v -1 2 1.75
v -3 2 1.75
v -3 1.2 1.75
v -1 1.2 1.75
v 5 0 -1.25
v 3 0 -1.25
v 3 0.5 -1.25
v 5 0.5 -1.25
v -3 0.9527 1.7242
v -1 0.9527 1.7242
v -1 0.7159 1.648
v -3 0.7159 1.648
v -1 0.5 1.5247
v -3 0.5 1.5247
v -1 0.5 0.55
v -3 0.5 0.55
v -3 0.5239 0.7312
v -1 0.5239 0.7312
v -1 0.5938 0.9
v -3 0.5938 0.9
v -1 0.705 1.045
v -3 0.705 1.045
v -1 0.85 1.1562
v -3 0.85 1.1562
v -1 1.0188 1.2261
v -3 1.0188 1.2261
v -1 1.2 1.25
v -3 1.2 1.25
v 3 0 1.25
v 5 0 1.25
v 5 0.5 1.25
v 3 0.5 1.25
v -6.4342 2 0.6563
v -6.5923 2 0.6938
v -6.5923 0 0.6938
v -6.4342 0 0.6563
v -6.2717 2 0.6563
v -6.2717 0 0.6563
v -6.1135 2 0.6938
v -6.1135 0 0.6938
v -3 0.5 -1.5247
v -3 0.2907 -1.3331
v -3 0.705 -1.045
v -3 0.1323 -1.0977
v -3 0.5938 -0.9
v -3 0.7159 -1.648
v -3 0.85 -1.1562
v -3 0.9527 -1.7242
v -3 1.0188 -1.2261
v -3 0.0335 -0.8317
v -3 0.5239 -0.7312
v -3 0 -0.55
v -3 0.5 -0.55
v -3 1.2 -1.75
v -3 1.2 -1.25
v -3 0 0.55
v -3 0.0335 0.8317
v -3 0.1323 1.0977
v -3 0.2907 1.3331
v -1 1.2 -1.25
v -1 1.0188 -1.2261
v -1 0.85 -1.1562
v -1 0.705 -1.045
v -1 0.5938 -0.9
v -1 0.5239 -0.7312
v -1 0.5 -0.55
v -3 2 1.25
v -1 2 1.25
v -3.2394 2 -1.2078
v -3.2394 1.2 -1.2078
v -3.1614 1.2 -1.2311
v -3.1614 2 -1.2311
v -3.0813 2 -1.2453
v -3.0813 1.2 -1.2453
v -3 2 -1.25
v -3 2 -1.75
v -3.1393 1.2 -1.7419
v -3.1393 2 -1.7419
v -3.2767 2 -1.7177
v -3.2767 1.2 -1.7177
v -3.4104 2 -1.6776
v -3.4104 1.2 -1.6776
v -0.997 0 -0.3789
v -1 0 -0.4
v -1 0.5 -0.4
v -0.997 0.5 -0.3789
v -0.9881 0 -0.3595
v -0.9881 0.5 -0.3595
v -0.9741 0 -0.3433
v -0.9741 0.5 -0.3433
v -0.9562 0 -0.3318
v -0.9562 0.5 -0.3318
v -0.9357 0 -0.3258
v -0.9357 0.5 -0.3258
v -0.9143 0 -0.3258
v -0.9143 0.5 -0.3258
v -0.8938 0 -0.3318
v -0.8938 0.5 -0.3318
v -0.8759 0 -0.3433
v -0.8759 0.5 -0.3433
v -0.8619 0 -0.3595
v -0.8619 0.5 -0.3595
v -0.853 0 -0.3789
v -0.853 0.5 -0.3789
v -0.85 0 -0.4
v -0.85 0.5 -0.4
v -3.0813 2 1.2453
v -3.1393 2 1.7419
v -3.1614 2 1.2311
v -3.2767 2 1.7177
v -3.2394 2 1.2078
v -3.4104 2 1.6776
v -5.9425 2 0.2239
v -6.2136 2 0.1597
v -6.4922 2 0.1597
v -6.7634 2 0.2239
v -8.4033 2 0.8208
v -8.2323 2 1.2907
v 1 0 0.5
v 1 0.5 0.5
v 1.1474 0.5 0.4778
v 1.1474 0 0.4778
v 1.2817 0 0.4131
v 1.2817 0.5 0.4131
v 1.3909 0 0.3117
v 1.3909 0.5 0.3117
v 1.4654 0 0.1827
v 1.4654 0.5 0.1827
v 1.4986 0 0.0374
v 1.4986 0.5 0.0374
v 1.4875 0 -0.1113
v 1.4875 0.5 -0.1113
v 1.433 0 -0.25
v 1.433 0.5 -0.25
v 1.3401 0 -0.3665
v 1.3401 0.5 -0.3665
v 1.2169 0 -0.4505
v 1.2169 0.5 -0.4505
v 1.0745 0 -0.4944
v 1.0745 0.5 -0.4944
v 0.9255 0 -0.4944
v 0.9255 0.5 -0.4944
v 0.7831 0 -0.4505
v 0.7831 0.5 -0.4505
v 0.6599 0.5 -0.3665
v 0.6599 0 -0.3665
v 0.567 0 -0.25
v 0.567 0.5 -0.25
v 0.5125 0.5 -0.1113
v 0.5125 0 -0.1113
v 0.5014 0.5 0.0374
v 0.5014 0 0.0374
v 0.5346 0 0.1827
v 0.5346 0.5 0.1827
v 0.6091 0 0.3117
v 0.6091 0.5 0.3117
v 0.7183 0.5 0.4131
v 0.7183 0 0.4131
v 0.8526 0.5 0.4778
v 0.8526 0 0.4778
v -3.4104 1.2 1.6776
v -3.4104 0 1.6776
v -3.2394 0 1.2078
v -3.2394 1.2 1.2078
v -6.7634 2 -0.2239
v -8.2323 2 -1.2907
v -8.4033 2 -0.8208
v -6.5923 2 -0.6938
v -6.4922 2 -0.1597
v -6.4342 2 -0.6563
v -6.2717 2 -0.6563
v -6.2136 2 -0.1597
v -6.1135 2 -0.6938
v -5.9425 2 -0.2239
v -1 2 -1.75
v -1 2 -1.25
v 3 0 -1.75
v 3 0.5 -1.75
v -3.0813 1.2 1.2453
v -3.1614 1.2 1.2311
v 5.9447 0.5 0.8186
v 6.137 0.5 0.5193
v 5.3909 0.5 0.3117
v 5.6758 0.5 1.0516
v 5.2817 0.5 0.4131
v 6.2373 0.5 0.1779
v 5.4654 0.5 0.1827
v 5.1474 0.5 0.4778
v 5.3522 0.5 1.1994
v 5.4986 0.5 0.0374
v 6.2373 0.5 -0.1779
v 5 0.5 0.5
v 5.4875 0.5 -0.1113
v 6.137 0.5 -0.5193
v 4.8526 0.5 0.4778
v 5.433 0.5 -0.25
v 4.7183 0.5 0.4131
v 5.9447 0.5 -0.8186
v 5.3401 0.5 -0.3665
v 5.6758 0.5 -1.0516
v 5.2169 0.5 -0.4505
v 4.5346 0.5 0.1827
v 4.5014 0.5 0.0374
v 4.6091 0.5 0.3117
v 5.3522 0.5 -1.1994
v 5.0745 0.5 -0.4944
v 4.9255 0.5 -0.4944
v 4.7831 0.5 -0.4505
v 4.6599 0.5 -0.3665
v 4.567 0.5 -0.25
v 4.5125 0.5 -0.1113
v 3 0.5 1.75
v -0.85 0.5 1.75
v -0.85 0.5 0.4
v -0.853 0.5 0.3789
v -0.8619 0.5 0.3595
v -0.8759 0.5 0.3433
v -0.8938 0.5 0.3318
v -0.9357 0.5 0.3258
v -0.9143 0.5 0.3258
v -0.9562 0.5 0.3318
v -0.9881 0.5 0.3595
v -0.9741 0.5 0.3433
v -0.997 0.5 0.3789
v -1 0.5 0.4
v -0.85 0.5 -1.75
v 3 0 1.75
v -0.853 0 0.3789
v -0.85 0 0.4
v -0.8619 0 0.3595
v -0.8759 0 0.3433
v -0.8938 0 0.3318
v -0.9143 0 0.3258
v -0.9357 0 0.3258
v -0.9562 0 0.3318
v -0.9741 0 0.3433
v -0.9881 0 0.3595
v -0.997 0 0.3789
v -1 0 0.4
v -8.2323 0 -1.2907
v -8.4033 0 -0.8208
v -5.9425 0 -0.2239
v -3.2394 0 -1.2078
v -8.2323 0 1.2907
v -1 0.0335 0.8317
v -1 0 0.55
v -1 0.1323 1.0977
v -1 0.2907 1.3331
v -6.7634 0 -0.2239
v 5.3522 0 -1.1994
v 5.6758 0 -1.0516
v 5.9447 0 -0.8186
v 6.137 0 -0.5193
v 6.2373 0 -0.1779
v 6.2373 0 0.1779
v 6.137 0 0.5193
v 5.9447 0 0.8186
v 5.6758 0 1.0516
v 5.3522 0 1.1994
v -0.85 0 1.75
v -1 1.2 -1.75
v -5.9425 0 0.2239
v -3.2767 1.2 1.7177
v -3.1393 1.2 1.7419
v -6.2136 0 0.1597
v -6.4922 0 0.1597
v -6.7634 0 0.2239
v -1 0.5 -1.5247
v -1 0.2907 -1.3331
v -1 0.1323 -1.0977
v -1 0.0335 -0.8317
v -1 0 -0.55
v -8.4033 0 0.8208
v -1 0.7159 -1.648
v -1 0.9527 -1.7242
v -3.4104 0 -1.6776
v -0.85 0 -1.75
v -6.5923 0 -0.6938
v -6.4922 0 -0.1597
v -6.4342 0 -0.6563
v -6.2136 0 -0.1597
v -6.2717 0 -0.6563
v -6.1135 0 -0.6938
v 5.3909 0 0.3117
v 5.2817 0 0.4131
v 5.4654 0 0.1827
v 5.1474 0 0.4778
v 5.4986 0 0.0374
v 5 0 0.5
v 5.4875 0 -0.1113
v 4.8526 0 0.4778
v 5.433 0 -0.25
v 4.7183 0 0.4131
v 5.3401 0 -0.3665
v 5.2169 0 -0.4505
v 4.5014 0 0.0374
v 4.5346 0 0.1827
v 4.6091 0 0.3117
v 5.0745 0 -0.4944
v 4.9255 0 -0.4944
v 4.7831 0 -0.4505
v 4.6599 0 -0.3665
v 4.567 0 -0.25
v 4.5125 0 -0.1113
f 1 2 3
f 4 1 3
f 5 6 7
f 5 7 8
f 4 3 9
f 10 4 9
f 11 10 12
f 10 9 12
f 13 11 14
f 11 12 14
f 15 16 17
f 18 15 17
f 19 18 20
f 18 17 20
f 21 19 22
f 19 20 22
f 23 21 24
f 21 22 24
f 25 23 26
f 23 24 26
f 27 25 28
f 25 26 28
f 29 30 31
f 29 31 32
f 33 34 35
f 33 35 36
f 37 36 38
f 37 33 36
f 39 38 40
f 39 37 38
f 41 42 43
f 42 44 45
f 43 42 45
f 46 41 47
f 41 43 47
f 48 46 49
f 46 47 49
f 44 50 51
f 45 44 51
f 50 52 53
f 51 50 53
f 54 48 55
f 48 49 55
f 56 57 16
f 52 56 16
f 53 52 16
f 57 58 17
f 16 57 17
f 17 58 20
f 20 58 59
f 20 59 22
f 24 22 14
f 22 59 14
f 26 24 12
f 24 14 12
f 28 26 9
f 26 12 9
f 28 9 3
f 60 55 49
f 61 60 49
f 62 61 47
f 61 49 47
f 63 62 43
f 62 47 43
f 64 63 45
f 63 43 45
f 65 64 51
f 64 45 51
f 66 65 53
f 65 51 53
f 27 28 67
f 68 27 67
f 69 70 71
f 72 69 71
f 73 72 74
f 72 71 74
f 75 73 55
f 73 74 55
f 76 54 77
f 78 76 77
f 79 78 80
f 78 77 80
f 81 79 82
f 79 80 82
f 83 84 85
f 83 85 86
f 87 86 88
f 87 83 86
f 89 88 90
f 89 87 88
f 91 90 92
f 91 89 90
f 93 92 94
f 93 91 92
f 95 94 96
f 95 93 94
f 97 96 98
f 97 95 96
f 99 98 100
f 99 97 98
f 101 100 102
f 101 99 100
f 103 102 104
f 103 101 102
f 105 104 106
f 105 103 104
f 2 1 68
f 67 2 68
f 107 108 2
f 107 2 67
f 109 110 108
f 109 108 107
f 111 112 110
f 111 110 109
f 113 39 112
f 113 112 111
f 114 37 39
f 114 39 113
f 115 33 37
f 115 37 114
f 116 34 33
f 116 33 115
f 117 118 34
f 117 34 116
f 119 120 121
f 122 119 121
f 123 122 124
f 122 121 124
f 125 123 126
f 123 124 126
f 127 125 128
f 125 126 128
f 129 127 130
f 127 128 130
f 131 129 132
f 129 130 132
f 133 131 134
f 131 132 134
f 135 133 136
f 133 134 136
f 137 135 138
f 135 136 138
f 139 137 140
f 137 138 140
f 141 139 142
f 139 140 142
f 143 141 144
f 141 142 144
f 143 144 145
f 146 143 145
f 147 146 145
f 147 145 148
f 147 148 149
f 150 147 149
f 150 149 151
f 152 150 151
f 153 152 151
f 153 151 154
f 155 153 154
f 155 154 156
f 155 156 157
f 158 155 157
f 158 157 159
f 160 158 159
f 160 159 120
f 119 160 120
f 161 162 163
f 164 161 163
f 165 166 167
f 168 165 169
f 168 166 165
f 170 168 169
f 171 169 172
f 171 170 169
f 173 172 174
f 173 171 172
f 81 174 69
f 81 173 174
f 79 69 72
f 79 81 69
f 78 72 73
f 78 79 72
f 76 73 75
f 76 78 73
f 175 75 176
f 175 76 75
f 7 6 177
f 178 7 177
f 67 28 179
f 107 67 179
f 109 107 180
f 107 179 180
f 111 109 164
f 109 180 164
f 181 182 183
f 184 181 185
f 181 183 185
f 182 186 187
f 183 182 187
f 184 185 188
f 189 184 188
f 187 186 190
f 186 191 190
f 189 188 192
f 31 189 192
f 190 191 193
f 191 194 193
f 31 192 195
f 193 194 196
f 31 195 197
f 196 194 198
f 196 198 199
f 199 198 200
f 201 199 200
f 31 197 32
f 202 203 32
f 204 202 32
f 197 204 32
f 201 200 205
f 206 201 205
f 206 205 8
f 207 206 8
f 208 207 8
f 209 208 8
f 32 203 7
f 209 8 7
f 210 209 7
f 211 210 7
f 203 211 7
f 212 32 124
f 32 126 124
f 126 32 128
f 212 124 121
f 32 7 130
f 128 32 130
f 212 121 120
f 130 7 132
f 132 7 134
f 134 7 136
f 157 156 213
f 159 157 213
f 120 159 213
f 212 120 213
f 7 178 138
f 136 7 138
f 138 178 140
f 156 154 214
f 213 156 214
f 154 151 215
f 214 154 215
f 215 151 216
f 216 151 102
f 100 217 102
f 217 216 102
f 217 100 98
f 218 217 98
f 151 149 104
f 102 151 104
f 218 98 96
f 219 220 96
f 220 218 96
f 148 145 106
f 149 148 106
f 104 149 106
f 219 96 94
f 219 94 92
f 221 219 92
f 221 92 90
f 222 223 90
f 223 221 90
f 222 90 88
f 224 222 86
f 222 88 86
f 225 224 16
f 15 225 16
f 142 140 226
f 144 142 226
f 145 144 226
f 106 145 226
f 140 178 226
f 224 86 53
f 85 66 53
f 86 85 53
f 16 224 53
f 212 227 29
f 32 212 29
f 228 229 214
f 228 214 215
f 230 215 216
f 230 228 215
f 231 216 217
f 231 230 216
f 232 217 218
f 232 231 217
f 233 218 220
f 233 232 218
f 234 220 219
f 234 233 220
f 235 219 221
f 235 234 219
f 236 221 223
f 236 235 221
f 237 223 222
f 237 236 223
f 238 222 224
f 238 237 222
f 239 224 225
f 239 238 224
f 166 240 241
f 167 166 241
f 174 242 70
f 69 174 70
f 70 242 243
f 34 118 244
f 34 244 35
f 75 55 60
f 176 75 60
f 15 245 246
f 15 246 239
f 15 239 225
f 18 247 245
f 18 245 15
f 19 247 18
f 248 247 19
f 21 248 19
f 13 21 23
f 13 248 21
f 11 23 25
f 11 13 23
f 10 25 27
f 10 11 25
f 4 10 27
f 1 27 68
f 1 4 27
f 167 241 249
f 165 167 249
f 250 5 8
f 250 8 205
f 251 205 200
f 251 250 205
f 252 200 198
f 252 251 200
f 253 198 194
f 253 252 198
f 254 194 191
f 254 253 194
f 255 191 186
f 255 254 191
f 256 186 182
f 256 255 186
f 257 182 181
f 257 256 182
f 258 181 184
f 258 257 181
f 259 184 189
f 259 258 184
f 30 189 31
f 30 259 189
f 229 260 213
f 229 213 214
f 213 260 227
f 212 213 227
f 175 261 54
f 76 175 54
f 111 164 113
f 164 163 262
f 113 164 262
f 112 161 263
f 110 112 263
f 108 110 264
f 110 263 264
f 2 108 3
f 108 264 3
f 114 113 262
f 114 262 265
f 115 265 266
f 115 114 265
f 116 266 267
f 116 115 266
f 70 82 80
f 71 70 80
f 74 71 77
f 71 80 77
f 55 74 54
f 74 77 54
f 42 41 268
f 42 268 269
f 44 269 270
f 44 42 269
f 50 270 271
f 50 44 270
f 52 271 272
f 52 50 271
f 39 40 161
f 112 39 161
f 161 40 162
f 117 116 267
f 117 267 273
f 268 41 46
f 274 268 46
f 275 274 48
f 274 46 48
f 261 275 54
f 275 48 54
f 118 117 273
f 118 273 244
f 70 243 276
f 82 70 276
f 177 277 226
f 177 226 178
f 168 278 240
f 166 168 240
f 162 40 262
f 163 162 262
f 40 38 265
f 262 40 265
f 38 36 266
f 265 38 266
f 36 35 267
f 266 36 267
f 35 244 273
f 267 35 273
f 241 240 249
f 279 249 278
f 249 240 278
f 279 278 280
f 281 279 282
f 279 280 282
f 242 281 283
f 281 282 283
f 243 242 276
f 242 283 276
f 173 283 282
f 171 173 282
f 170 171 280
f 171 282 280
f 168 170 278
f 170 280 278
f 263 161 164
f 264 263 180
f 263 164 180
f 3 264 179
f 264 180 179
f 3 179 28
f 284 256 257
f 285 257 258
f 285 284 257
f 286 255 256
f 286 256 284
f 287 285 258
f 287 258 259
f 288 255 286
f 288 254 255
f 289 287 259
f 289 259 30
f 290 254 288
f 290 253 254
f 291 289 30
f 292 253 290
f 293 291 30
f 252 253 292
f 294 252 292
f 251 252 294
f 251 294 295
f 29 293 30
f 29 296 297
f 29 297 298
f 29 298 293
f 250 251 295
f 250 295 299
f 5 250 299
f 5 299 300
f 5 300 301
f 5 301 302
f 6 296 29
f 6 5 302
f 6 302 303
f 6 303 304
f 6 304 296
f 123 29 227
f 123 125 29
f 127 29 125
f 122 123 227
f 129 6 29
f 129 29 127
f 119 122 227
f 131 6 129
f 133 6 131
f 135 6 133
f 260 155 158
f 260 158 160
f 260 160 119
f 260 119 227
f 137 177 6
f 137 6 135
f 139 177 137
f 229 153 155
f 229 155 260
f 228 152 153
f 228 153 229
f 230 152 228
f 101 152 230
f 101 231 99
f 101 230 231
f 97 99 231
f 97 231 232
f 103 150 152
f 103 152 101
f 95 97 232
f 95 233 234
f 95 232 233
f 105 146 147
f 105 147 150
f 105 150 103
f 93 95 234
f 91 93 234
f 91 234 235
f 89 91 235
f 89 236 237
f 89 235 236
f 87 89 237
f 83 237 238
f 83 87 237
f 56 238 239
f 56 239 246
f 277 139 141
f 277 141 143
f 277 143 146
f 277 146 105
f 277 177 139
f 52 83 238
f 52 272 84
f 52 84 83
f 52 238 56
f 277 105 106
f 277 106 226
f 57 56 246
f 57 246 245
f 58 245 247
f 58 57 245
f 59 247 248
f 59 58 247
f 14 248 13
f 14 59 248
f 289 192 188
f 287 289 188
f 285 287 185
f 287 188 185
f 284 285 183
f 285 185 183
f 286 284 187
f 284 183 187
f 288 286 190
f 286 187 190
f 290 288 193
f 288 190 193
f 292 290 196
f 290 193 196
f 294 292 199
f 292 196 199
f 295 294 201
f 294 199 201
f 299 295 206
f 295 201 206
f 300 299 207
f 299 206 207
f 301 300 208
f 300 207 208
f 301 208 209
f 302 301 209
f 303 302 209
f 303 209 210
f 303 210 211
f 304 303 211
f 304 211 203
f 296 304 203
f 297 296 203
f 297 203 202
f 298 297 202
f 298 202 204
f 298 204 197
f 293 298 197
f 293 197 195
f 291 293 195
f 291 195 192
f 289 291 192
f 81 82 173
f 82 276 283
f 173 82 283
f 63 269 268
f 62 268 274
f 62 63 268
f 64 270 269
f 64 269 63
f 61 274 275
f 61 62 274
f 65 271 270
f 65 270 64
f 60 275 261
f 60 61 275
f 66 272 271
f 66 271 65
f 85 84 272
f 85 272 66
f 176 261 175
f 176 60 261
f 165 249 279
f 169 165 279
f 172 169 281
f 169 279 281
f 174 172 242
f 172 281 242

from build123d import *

# Parameters (mm, degrees)
SKETCH1_W                      = 6
SKETCH1_H                      = 3.5
BASE_DEPTH                     = 0.5
TAB_DEPTH                      = 0.5
SKETCH3_R                      = 0.5
SOLDERING_HOLE_DEPTH           = 7.509608283
SKETCH4_R                      = 0.5
RIVET_HOLE_DEPTH               = 7.509608283
FIRST_START                    = -3
FIRST_SIDE_TAB_DEPTH           = 2.15
FIRST_SIDE_TAB_2_DEPTH         = 2
FIRST_START_2                  = -1
FIRST_SIDE_TAB_3_DEPTH         = 2.2
SECOND_ANGLED_SIDE_TAB_DEPTH   = 2
SECOND_START                   = 1.2
SECOND_ANGLED_SIDE_TAB_2_DEPTH = 0.8
THIRD_ANGLED_SIDE_TAB_DEPTH    = 2
MIRROR1_DEPTH                  = 0.5
MIRROR1_2_OUTLINE_W            = 2
MIRROR1_2_OUTLINE_H            = 0.5
MIRROR1_2_DEPTH                = 0.04719
MIRROR1_3_DEPTH                = 2
MIRROR1_START                  = 1.2
MIRROR1_4_DEPTH                = 0.8
MIRROR1_START_2                = -3
MIRROR1_5_DEPTH                = 2
MIRROR1_6_DEPTH                = 2


with BuildPart() as part:
    # Sketch1 → BASE (new body)
    with BuildSketch(Plane(origin=(0, 0, 0), x_dir=(1, 0, 0), z_dir=(0, 1, 0))):
        Rectangle(SKETCH1_W, SKETCH1_H)
    extrude(amount=BASE_DEPTH)

    # Sketch2 → TAB (add)
    with BuildSketch(Plane(origin=(0, 0, 0), x_dir=(1, 0, 0), z_dir=(0, 1, 0))):
        with BuildLine():
            Line((5, -1.25), (3, -1.25))
            ThreePointArc((3, -1.25), (1.75, 0), (3, 1.25))
            Line((3, 1.25), (5, 1.25))
            ThreePointArc((5, 1.25), (6.25, 0), (5, -1.25))
        make_face()
    extrude(amount=TAB_DEPTH)

    # Sketch3 → SOLDERING HOLE (cut, through all)
    with BuildSketch(Plane(origin=(0, 0.5, 0), x_dir=(1, 0, 0), z_dir=(0, 1, 0))):
        with Locations(Location((5, 0, 0), (0, 0, 270))):
            Circle(SKETCH3_R)
    extrude(amount=-SOLDERING_HOLE_DEPTH, mode=Mode.SUBTRACT)

    # Sketch4 → RIVET HOLE (cut, through all)
    with BuildSketch(Plane(origin=(0, 0.5, 0), x_dir=(1, 0, 0), z_dir=(0, 1, 0))):
        with Locations(Location((1, 0, 0), (0, 0, 270))):
            Circle(SKETCH4_R)
    extrude(amount=-RIVET_HOLE_DEPTH, mode=Mode.SUBTRACT)

    # FIRST SIDE TAB: read off the stored shape, not the designer's step
    # FIRST SIDE TAB outline → FIRST SIDE TAB (cut)
    with BuildSketch(Plane.YZ.offset(FIRST_START)):
        with BuildLine():
            ThreePointArc((0, 0.55), (0.132292175, 1.097722557), (0.5, 1.524679434))
            Line((0.5, 1.524679434), (0.5, 1.75))
            Line((0.5, 1.75), (0, 1.75))
            Line((0, 1.75), (0, 0.55))
        make_face()
    extrude(amount=FIRST_SIDE_TAB_DEPTH, mode=Mode.SUBTRACT)

    # FIRST SIDE TAB 2 outline → FIRST SIDE TAB 2 (add)
    with BuildSketch(Plane.YZ.offset(FIRST_START)):
        with BuildLine():
            Line((2, 1.75), (1.2, 1.75))
            ThreePointArc((1.2, 1.75), (0.832314891, 1.692281778), (0.5, 1.524679434))
            Line((0.5, 1.524679434), (0.5, 0.55))
            ThreePointArc((0.5, 0.55), (0.705025253, 1.044974747), (1.2, 1.25))
            Line((1.2, 1.25), (2, 1.25))
            Line((2, 1.25), (2, 1.75))
        make_face()
    extrude(amount=FIRST_SIDE_TAB_2_DEPTH)

    # FIRST SIDE TAB 3 outline → FIRST SIDE TAB 3 (cut)
    with BuildSketch(Plane(origin=(0, 0, 0), x_dir=(1, 0, 0), z_dir=(0, 1, 0)).offset(FIRST_START_2)):
        with BuildLine():
            Line((-0.85, -3), (-0.85, -0.4))
            ThreePointArc((-0.85, -0.4), (-0.925, -0.325), (-1, -0.4))
            Line((-1, -0.4), (-1, -3))
            Line((-1, -3), (-0.85, -3))
        make_face()
    extrude(amount=FIRST_SIDE_TAB_3_DEPTH, mode=Mode.SUBTRACT)



with BuildPart() as body_2:
    # SECOND ANGLED SIDE TAB: read off the stored shape, not the designer's step
    # SECOND ANGLED SIDE TAB outline → SECOND ANGLED SIDE TAB (new body)
    with BuildSketch(Plane(origin=(0, 0, 0), x_dir=(1, 0, 0), z_dir=(0, 1, 0))):
        Polygon((-6.113516821, -0.69378588), (-3.410424172, -1.677631145), (-3.2394141, -1.207784835), (-5.942506749, -0.22393957), align=None)
    extrude(amount=SECOND_ANGLED_SIDE_TAB_DEPTH)


with BuildPart() as part_1:
    add(part.part)

    add(body_2.part)  # SECOND ANGLED SIDE TAB 2 merges body 2
    # SECOND ANGLED SIDE TAB 2 outline → SECOND ANGLED SIDE TAB 2 (add)
    with BuildSketch(Plane(origin=(0, 0, 0), x_dir=(1, 0, 0), z_dir=(0, 1, 0)).offset(SECOND_START)):
        with BuildLine():
            Line((-3.2394141, -1.207784835), (-3.410424172, -1.677631145))
            ThreePointArc((-3.410424172, -1.677631145), (-3.208377813, -1.731769304), (-3, -1.75))
            Line((-3, -1.75), (-3, -1.25))
            ThreePointArc((-3, -1.25), (-3.121553724, -1.239365427), (-3.2394141, -1.207784835))
        make_face()
    extrude(amount=SECOND_ANGLED_SIDE_TAB_2_DEPTH)

    # THIRD ANGLED SIDE TAB: sheet metal written as solids
    # THIRD ANGLED SIDE TAB section (on a plane across the edge) → THIRD ANGLED SIDE TAB (add)
    with BuildSketch(Plane(origin=(-6.352930921, 2, 0.606646274), x_dir=(0.3420201433256691, 0, 0.9396926207859083), z_dir=(0, -1, 0))):
        with BuildLine():
            Line((-0.5, 0.254779164), (-0.5, 2))
            Line((-0.5, 2), (0, 2))
            Line((0, 2), (0, 0.254779164))
            ThreePointArc((0, 0.254779164), (0.042215165, 0.015365064), (0.16376889, -0.195172163))
            Line((0.16376889, -0.195172163), (-0.219253332, -0.516565968))
            ThreePointArc((-0.219253332, -0.516565968), (-0.427631145, -0.155645008), (-0.5, 0.254779164))
        make_face()
    extrude(amount=THIRD_ANGLED_SIDE_TAB_DEPTH)

    # Mirror1: read off the stored shape, not the designer's step
    # Mirror1 outline → Mirror1 (cut)
    with BuildSketch(Plane(origin=(0, 0, 0), x_dir=(1, 0, 0), z_dir=(0, 1, 0))):
        with BuildLine():
            Line((-0.85, 1.75), (-1, 1.75))
            Line((-1, 1.75), (-1, 0.4))
            ThreePointArc((-1, 0.4), (-0.925, 0.325), (-0.85, 0.4))
            Line((-0.85, 0.4), (-0.85, 1.75))
        make_face()
    extrude(amount=MIRROR1_DEPTH, mode=Mode.SUBTRACT)

    # Mirror1 2 outline → Mirror1 2 (cut)
    with BuildSketch(Plane(origin=(0, 0, 0), x_dir=(1, 0, 0), z_dir=(0, 1, 0))):
        with Locations((-2, 1.5)):
            Rectangle(MIRROR1_2_OUTLINE_W, MIRROR1_2_OUTLINE_H)
    extrude(amount=MIRROR1_2_DEPTH, mode=Mode.SUBTRACT)

    # Mirror1 5 outline → Mirror1 5 (cut)
    with BuildSketch(Plane.YZ.offset(MIRROR1_START_2)):
        with BuildLine():
            Line((0.5, -1.75), (0.5, -1.524679434))
            ThreePointArc((0.5, -1.524679434), (0.132292175, -1.097722557), (0, -0.55))
            Line((0, -0.55), (0, -1.25))
            Line((0, -1.25), (0.04719, -1.25))
            Line((0.04719, -1.25), (0.04719, -1.75))
            Line((0.04719, -1.75), (0.5, -1.75))
        make_face()
    extrude(amount=MIRROR1_5_DEPTH, mode=Mode.SUBTRACT)



with BuildPart() as body_2_2:
    # Mirror1 3 outline → Mirror1 3 (new body)
    with BuildSketch(Plane(origin=(0, 0, 0), x_dir=(1, 0, 0), z_dir=(0, 1, 0))):
        with BuildLine():
            Line((-3.2394141, 1.207784835), (-3.410424172, 1.677631145))
            Line((-3.410424172, 1.677631145), (-6.113516821, 0.69378588))
            ThreePointArc((-6.113516821, 0.69378588), (-6.352930921, 0.651570715), (-6.592345021, 0.69378588))
            Line((-6.592345021, 0.69378588), (-8.232316162, 1.290686561))
            Line((-8.232316162, 1.290686561), (-8.403326234, 0.82084025))
            Line((-8.403326234, 0.82084025), (-6.763355093, 0.22393957))
            ThreePointArc((-6.763355093, 0.22393957), (-6.352930921, 0.151570715), (-5.942506749, 0.22393957))
            Line((-5.942506749, 0.22393957), (-3.2394141, 1.207784835))
        make_face()
    extrude(amount=MIRROR1_3_DEPTH)

    # Mirror1 4 outline → Mirror1 4 (add)
    with BuildSketch(Plane(origin=(0, 0, 0), x_dir=(1, 0, 0), z_dir=(0, 1, 0)).offset(MIRROR1_START)):
        with BuildLine():
            Line((-1, 1.75), (-3, 1.75))
            ThreePointArc((-3, 1.75), (-3.208377813, 1.731769304), (-3.410424172, 1.677631145))
            Line((-3.410424172, 1.677631145), (-3.2394141, 1.207784835))
            ThreePointArc((-3.2394141, 1.207784835), (-3.121553724, 1.239365427), (-3, 1.25))
            Line((-3, 1.25), (-1, 1.25))
            Line((-1, 1.25), (-1, 1.75))
        make_face()
    extrude(amount=MIRROR1_4_DEPTH)


with BuildPart() as part_2:
    add(part_1.part)

    add(body_2_2.part)  # Mirror1 6 merges body 2 2
    # Mirror1 6 outline → Mirror1 6 (add)
    with BuildSketch(Plane.YZ.offset(MIRROR1_START_2)):
        with BuildLine():
            ThreePointArc((0.5, -1.524679434), (0.832314891, -1.692281778), (1.2, -1.75))
            Line((1.2, -1.75), (1.2, -1.25))
            ThreePointArc((1.2, -1.25), (0.705025253, -1.044974747), (0.5, -0.55))
            Line((0.5, -0.55), (0.5, -1.524679434))
        make_face()
    extrude(amount=MIRROR1_6_DEPTH)


solid = part_2.part
